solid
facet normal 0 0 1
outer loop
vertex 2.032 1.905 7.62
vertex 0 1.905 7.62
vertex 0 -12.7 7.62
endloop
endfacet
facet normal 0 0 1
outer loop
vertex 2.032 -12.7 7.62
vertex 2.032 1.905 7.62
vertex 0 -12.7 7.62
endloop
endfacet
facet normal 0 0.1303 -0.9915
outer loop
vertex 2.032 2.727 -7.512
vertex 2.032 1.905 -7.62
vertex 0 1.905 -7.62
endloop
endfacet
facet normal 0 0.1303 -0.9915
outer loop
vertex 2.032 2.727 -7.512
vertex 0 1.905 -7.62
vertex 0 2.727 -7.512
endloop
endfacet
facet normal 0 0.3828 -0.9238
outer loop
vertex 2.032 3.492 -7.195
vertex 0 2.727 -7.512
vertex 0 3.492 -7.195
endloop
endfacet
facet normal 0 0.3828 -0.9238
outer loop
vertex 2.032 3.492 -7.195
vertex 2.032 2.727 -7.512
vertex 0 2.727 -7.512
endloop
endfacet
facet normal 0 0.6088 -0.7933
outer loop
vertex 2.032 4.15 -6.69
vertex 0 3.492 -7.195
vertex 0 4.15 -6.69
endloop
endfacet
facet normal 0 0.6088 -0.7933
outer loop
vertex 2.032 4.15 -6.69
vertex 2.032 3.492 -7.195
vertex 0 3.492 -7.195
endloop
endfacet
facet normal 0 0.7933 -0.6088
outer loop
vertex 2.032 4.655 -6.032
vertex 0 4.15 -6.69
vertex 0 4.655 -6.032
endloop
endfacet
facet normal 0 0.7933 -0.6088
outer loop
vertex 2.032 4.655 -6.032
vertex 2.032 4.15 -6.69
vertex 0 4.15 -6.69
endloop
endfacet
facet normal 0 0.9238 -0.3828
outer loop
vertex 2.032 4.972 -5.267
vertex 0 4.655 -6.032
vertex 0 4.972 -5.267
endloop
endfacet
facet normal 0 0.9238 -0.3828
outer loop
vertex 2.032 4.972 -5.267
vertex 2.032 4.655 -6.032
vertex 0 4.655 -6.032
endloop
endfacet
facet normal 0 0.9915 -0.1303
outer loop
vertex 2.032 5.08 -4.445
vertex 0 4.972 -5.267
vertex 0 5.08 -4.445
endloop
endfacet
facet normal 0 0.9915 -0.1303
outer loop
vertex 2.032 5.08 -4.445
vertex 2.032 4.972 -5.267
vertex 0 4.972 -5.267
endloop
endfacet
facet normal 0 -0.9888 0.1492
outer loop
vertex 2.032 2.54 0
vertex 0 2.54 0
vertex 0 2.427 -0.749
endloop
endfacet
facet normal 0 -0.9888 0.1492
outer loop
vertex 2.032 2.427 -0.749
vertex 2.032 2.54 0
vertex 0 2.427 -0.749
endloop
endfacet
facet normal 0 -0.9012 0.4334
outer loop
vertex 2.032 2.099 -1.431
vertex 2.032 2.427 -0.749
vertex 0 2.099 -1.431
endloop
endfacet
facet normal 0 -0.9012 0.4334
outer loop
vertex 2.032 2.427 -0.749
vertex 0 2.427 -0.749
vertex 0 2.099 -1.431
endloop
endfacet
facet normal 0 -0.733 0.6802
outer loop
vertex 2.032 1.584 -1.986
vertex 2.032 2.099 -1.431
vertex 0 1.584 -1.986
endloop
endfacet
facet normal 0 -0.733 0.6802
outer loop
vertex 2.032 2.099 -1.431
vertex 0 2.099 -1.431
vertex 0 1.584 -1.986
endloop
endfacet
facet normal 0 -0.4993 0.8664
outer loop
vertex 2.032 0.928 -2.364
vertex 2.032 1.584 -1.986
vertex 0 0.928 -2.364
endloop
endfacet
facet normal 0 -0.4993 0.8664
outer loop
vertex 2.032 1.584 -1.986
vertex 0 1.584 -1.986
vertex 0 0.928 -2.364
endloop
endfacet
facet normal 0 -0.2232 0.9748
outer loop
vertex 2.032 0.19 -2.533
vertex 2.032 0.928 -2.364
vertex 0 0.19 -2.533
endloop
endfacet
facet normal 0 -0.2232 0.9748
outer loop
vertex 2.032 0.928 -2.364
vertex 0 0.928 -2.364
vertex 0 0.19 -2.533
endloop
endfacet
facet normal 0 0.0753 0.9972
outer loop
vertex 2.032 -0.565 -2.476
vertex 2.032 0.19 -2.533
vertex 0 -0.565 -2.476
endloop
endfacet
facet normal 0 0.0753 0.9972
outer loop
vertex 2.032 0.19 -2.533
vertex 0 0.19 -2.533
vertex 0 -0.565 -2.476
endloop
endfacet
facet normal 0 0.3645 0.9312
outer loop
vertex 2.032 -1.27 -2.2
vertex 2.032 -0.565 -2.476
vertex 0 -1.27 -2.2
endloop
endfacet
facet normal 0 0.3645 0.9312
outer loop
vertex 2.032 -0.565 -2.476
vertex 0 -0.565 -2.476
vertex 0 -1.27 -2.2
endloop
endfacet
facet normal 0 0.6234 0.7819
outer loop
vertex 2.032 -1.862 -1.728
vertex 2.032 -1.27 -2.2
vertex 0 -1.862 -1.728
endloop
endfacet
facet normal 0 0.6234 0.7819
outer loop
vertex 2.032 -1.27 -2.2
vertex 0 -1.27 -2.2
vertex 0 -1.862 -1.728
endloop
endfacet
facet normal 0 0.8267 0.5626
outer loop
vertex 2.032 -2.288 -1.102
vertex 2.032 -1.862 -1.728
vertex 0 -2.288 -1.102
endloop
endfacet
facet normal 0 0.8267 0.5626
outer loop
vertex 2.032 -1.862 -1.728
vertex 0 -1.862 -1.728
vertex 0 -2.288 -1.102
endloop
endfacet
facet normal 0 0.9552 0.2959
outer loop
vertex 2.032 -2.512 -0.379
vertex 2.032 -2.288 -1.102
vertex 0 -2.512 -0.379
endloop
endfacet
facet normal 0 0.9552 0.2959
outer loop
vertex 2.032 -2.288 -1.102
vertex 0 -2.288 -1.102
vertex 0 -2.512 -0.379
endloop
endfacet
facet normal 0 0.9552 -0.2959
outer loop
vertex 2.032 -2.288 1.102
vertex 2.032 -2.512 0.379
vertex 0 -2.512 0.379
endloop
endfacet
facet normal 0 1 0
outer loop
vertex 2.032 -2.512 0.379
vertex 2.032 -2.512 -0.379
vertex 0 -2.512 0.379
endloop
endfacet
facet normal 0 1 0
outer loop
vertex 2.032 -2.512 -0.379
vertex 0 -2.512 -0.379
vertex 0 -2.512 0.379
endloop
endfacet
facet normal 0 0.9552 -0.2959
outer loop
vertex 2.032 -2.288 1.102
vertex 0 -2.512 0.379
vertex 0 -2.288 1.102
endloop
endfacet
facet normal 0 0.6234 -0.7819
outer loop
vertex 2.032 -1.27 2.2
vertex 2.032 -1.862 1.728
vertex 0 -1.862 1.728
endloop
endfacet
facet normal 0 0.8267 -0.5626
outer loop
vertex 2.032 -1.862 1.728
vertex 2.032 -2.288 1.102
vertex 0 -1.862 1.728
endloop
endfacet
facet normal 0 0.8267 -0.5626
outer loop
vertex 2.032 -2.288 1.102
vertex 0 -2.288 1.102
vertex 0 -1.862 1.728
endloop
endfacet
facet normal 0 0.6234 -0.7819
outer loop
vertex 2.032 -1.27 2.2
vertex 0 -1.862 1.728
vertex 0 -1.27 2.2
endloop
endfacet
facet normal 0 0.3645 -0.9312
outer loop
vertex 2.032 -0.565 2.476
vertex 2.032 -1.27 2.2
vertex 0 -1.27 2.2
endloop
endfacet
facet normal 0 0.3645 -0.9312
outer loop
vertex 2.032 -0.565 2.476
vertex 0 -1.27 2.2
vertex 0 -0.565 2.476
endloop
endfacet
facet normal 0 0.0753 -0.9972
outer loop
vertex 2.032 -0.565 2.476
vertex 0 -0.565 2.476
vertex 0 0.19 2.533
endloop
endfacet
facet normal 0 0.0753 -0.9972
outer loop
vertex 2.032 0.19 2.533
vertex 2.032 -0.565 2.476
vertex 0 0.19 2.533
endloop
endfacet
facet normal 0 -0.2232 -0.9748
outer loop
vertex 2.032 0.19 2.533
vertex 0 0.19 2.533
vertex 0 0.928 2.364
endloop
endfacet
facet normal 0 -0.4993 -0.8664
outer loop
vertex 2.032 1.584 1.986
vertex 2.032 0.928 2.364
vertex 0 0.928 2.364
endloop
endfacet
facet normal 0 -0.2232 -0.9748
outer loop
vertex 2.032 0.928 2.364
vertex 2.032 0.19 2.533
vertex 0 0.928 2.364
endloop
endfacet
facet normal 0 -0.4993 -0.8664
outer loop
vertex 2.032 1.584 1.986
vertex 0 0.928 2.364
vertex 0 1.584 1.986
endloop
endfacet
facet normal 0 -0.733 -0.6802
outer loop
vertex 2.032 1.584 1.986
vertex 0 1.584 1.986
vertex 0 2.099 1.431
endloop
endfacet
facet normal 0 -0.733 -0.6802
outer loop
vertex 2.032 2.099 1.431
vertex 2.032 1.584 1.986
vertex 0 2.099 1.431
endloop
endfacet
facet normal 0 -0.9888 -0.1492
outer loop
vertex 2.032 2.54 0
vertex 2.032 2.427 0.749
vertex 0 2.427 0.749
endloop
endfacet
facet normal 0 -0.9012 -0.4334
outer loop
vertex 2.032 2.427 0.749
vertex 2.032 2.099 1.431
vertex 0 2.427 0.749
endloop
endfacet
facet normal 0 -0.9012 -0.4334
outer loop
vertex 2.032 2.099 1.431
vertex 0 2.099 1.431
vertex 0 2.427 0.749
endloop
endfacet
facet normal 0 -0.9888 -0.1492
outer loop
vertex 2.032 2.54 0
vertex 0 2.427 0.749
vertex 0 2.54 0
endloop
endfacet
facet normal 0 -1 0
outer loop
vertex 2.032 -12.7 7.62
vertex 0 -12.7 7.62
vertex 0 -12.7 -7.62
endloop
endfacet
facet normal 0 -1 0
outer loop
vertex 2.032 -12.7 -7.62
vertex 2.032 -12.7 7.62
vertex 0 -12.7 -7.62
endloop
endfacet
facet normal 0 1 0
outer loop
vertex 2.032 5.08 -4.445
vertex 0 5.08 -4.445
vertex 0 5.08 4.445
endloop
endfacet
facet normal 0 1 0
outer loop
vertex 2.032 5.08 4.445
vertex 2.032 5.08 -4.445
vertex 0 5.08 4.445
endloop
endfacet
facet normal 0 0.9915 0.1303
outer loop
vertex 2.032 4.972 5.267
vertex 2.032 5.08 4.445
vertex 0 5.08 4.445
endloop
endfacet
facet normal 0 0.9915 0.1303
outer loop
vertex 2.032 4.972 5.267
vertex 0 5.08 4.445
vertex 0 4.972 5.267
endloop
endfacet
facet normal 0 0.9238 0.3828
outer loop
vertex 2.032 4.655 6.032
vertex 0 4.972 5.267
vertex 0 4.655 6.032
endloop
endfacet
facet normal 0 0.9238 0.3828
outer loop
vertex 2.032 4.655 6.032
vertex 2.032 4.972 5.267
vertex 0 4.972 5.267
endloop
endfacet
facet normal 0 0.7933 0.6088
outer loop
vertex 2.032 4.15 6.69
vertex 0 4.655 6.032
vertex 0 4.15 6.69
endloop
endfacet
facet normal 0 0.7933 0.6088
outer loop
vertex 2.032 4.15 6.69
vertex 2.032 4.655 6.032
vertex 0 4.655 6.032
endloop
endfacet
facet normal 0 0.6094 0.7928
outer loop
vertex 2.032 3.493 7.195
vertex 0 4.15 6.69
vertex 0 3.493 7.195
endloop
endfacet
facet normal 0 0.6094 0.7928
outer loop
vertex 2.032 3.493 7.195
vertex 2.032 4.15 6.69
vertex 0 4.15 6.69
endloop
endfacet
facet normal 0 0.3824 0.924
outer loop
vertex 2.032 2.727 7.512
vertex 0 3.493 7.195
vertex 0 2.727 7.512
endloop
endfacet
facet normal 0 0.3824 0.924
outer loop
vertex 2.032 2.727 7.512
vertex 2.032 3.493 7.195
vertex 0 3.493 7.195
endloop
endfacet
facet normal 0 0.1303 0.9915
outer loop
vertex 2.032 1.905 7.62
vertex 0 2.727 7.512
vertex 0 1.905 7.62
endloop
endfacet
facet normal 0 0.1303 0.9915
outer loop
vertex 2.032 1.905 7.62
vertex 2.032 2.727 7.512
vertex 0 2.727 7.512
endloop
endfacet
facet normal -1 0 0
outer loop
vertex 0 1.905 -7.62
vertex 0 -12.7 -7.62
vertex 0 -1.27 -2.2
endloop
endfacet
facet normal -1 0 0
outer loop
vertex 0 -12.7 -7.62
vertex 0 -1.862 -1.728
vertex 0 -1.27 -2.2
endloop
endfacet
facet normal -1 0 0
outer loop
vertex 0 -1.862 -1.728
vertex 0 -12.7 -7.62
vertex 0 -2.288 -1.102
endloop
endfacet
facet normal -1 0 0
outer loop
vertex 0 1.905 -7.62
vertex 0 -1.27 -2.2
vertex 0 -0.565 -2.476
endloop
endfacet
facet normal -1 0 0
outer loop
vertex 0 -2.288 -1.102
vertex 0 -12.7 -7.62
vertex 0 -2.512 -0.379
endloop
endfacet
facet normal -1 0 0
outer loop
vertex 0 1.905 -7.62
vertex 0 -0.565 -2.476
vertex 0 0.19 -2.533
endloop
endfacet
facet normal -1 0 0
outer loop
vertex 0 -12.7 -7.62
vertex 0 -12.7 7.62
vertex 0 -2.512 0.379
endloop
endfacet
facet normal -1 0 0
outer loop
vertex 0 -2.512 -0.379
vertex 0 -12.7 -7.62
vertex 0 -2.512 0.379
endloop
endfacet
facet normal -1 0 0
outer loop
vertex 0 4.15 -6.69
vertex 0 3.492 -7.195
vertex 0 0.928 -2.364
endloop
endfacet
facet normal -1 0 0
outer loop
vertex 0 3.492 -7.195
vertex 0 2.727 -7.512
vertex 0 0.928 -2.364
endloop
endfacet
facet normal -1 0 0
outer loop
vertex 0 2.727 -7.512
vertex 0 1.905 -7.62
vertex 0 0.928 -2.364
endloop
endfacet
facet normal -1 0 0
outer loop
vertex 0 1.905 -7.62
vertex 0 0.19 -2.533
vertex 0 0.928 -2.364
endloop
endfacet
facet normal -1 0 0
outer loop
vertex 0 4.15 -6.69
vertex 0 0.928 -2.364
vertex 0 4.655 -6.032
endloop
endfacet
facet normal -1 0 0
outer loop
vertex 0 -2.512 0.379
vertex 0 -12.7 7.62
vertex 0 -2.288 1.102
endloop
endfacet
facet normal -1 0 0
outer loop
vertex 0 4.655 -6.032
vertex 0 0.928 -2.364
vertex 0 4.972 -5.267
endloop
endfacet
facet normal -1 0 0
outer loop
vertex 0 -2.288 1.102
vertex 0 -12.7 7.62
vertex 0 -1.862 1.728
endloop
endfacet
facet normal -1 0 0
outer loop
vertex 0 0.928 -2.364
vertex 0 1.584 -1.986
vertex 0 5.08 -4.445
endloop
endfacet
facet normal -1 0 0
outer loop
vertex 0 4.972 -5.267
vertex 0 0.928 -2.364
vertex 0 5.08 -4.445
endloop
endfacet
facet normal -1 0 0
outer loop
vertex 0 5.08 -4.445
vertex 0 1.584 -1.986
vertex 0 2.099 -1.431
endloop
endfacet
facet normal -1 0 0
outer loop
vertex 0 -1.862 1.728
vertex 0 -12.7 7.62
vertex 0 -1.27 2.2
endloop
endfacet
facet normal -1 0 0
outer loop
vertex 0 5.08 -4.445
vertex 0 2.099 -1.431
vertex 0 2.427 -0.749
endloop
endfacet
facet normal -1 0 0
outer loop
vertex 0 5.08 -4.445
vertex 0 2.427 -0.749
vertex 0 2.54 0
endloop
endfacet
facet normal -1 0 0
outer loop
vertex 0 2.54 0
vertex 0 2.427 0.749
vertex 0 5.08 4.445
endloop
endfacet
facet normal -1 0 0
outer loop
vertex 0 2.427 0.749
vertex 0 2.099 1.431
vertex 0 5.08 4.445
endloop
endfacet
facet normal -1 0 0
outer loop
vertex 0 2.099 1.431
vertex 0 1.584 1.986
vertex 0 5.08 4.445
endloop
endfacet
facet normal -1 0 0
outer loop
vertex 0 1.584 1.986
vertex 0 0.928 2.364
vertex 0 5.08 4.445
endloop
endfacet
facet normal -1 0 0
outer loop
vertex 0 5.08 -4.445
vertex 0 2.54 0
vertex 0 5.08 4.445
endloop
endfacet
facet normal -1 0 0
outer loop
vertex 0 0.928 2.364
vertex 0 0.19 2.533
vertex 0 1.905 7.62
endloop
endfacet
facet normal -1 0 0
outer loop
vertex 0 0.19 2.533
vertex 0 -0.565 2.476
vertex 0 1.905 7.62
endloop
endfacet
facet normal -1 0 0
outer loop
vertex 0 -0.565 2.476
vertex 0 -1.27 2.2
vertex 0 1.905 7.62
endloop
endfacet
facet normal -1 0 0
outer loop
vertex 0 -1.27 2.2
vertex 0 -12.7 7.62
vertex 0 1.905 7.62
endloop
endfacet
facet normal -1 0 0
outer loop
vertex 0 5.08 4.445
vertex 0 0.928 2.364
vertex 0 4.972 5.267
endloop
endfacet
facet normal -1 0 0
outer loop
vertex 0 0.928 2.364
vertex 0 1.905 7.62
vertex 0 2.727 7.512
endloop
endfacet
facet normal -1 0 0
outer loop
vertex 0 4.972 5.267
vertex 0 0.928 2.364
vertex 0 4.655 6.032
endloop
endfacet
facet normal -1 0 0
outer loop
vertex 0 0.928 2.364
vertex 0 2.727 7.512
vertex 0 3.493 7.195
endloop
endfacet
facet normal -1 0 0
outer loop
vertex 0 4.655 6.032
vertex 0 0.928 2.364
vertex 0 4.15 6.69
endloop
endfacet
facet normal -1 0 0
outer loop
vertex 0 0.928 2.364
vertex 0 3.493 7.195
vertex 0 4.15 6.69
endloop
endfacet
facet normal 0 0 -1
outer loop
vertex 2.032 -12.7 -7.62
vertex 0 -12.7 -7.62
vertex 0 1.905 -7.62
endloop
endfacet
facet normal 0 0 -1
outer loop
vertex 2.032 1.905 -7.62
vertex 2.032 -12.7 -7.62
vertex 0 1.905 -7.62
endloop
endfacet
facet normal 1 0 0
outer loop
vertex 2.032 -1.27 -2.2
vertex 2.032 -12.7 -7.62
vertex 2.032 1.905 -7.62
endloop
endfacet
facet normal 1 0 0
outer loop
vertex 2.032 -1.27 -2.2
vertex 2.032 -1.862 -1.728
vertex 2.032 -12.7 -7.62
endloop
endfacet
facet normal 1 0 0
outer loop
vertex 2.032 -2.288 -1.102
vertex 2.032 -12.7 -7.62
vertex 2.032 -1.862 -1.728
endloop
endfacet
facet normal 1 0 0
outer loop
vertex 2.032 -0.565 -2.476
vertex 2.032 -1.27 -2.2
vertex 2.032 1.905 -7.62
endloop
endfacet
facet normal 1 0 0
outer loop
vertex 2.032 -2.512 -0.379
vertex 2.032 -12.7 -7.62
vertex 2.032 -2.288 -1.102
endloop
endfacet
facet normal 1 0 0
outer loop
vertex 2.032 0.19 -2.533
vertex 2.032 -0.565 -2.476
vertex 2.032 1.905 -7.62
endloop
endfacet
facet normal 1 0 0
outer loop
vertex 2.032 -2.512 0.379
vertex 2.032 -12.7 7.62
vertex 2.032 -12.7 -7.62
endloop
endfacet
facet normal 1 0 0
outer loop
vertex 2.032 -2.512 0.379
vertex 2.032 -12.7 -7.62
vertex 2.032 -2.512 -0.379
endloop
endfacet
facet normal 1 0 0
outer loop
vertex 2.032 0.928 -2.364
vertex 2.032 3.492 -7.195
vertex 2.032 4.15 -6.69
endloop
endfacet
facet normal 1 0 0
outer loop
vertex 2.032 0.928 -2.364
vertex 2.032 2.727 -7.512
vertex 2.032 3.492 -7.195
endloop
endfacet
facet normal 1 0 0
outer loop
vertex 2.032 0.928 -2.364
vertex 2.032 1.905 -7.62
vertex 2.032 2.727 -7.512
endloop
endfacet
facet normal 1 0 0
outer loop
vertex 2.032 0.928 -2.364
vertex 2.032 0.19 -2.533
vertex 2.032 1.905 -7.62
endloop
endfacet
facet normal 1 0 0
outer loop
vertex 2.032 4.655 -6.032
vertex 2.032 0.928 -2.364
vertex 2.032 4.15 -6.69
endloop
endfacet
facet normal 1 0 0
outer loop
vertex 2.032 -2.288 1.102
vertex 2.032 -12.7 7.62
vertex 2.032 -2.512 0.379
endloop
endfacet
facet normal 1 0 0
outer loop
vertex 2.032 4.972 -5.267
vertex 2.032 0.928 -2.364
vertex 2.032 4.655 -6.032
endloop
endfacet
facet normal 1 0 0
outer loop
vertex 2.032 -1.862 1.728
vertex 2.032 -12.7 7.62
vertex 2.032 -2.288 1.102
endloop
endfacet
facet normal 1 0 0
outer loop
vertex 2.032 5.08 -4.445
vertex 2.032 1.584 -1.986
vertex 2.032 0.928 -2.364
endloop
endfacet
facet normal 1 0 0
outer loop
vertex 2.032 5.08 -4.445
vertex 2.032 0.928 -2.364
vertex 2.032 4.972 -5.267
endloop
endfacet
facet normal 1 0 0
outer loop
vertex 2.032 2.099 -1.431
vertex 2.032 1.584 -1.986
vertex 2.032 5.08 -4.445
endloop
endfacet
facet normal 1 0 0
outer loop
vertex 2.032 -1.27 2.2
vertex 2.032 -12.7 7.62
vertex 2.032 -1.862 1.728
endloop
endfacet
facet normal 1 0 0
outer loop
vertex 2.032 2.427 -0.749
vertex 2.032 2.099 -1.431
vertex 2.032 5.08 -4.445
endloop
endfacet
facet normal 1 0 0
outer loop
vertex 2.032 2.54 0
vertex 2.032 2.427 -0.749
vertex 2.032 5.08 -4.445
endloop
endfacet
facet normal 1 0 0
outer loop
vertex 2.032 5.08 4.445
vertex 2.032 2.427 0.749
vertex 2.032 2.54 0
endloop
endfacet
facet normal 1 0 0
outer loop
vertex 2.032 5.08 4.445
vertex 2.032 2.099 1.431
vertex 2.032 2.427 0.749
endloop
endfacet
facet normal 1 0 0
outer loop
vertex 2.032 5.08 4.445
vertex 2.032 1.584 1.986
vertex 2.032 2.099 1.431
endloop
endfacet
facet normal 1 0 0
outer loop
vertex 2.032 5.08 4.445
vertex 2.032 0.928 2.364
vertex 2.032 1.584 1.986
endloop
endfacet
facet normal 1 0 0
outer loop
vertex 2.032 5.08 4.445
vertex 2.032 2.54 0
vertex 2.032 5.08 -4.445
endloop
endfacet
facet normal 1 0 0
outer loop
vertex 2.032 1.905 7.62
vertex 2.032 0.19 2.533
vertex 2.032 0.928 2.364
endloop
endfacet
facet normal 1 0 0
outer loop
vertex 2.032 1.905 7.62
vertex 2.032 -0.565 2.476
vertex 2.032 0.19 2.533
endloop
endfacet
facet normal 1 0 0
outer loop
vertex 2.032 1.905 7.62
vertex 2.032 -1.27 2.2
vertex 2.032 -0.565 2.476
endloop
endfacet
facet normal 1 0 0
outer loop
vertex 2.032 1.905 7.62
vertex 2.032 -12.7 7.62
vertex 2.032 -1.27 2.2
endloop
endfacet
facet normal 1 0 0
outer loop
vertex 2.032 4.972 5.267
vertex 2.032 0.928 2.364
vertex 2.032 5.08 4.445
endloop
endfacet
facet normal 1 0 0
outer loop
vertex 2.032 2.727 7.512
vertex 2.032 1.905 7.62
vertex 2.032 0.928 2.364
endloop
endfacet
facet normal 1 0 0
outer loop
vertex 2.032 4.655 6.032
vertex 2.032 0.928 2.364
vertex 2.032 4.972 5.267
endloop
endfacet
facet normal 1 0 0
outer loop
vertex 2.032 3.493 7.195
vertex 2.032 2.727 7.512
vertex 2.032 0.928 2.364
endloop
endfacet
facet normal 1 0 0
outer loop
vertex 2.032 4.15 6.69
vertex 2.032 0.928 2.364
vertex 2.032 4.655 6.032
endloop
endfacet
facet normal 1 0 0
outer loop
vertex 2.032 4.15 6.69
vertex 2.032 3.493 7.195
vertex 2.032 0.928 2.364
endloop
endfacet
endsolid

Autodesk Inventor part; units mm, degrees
ref_plane "YZ Plane" through (0, 0, 0) normal (1, 0, 0) x (0, 1, 0)
ref_plane "XZ Plane" through (0, 0, 0) normal (0, 1, 0) x (-1, 0, 0)
ref_plane "XY Plane" through (0, 0, 0) normal (0, 0, 1) x (1, 0, 0)
sketch "Sketch1" plane through (0, 0, 0) normal (1, 0, 0) x (0, 1, 0)
  circle A0 centre (0, 0) radius 2.54
  line L0 (5.08, 7.62) -> (-12.7, 7.62)
  line L1 (-12.7, 7.62) -> (-12.7, -7.62)
  line L2 (-12.7, -7.62) -> (5.08, -7.62)
  line L3 (5.08, -7.62) -> (5.08, 7.62)
  point P0 (5.08, 0)
  dimension "d0" = 5.08
  dimension "d1" = 15.24
  dimension "d2" = 17.78
  dimension "d5" = 5.08
extrude "Extrusion1" add sketch "Sketch1" along normal blind 2.032
fillet "Fillet1" radius 3.175 2 edges at (1.016, 5.08, 7.62) (1.016, 5.08, -7.62)
properties part number "Ell-Tab_small"
